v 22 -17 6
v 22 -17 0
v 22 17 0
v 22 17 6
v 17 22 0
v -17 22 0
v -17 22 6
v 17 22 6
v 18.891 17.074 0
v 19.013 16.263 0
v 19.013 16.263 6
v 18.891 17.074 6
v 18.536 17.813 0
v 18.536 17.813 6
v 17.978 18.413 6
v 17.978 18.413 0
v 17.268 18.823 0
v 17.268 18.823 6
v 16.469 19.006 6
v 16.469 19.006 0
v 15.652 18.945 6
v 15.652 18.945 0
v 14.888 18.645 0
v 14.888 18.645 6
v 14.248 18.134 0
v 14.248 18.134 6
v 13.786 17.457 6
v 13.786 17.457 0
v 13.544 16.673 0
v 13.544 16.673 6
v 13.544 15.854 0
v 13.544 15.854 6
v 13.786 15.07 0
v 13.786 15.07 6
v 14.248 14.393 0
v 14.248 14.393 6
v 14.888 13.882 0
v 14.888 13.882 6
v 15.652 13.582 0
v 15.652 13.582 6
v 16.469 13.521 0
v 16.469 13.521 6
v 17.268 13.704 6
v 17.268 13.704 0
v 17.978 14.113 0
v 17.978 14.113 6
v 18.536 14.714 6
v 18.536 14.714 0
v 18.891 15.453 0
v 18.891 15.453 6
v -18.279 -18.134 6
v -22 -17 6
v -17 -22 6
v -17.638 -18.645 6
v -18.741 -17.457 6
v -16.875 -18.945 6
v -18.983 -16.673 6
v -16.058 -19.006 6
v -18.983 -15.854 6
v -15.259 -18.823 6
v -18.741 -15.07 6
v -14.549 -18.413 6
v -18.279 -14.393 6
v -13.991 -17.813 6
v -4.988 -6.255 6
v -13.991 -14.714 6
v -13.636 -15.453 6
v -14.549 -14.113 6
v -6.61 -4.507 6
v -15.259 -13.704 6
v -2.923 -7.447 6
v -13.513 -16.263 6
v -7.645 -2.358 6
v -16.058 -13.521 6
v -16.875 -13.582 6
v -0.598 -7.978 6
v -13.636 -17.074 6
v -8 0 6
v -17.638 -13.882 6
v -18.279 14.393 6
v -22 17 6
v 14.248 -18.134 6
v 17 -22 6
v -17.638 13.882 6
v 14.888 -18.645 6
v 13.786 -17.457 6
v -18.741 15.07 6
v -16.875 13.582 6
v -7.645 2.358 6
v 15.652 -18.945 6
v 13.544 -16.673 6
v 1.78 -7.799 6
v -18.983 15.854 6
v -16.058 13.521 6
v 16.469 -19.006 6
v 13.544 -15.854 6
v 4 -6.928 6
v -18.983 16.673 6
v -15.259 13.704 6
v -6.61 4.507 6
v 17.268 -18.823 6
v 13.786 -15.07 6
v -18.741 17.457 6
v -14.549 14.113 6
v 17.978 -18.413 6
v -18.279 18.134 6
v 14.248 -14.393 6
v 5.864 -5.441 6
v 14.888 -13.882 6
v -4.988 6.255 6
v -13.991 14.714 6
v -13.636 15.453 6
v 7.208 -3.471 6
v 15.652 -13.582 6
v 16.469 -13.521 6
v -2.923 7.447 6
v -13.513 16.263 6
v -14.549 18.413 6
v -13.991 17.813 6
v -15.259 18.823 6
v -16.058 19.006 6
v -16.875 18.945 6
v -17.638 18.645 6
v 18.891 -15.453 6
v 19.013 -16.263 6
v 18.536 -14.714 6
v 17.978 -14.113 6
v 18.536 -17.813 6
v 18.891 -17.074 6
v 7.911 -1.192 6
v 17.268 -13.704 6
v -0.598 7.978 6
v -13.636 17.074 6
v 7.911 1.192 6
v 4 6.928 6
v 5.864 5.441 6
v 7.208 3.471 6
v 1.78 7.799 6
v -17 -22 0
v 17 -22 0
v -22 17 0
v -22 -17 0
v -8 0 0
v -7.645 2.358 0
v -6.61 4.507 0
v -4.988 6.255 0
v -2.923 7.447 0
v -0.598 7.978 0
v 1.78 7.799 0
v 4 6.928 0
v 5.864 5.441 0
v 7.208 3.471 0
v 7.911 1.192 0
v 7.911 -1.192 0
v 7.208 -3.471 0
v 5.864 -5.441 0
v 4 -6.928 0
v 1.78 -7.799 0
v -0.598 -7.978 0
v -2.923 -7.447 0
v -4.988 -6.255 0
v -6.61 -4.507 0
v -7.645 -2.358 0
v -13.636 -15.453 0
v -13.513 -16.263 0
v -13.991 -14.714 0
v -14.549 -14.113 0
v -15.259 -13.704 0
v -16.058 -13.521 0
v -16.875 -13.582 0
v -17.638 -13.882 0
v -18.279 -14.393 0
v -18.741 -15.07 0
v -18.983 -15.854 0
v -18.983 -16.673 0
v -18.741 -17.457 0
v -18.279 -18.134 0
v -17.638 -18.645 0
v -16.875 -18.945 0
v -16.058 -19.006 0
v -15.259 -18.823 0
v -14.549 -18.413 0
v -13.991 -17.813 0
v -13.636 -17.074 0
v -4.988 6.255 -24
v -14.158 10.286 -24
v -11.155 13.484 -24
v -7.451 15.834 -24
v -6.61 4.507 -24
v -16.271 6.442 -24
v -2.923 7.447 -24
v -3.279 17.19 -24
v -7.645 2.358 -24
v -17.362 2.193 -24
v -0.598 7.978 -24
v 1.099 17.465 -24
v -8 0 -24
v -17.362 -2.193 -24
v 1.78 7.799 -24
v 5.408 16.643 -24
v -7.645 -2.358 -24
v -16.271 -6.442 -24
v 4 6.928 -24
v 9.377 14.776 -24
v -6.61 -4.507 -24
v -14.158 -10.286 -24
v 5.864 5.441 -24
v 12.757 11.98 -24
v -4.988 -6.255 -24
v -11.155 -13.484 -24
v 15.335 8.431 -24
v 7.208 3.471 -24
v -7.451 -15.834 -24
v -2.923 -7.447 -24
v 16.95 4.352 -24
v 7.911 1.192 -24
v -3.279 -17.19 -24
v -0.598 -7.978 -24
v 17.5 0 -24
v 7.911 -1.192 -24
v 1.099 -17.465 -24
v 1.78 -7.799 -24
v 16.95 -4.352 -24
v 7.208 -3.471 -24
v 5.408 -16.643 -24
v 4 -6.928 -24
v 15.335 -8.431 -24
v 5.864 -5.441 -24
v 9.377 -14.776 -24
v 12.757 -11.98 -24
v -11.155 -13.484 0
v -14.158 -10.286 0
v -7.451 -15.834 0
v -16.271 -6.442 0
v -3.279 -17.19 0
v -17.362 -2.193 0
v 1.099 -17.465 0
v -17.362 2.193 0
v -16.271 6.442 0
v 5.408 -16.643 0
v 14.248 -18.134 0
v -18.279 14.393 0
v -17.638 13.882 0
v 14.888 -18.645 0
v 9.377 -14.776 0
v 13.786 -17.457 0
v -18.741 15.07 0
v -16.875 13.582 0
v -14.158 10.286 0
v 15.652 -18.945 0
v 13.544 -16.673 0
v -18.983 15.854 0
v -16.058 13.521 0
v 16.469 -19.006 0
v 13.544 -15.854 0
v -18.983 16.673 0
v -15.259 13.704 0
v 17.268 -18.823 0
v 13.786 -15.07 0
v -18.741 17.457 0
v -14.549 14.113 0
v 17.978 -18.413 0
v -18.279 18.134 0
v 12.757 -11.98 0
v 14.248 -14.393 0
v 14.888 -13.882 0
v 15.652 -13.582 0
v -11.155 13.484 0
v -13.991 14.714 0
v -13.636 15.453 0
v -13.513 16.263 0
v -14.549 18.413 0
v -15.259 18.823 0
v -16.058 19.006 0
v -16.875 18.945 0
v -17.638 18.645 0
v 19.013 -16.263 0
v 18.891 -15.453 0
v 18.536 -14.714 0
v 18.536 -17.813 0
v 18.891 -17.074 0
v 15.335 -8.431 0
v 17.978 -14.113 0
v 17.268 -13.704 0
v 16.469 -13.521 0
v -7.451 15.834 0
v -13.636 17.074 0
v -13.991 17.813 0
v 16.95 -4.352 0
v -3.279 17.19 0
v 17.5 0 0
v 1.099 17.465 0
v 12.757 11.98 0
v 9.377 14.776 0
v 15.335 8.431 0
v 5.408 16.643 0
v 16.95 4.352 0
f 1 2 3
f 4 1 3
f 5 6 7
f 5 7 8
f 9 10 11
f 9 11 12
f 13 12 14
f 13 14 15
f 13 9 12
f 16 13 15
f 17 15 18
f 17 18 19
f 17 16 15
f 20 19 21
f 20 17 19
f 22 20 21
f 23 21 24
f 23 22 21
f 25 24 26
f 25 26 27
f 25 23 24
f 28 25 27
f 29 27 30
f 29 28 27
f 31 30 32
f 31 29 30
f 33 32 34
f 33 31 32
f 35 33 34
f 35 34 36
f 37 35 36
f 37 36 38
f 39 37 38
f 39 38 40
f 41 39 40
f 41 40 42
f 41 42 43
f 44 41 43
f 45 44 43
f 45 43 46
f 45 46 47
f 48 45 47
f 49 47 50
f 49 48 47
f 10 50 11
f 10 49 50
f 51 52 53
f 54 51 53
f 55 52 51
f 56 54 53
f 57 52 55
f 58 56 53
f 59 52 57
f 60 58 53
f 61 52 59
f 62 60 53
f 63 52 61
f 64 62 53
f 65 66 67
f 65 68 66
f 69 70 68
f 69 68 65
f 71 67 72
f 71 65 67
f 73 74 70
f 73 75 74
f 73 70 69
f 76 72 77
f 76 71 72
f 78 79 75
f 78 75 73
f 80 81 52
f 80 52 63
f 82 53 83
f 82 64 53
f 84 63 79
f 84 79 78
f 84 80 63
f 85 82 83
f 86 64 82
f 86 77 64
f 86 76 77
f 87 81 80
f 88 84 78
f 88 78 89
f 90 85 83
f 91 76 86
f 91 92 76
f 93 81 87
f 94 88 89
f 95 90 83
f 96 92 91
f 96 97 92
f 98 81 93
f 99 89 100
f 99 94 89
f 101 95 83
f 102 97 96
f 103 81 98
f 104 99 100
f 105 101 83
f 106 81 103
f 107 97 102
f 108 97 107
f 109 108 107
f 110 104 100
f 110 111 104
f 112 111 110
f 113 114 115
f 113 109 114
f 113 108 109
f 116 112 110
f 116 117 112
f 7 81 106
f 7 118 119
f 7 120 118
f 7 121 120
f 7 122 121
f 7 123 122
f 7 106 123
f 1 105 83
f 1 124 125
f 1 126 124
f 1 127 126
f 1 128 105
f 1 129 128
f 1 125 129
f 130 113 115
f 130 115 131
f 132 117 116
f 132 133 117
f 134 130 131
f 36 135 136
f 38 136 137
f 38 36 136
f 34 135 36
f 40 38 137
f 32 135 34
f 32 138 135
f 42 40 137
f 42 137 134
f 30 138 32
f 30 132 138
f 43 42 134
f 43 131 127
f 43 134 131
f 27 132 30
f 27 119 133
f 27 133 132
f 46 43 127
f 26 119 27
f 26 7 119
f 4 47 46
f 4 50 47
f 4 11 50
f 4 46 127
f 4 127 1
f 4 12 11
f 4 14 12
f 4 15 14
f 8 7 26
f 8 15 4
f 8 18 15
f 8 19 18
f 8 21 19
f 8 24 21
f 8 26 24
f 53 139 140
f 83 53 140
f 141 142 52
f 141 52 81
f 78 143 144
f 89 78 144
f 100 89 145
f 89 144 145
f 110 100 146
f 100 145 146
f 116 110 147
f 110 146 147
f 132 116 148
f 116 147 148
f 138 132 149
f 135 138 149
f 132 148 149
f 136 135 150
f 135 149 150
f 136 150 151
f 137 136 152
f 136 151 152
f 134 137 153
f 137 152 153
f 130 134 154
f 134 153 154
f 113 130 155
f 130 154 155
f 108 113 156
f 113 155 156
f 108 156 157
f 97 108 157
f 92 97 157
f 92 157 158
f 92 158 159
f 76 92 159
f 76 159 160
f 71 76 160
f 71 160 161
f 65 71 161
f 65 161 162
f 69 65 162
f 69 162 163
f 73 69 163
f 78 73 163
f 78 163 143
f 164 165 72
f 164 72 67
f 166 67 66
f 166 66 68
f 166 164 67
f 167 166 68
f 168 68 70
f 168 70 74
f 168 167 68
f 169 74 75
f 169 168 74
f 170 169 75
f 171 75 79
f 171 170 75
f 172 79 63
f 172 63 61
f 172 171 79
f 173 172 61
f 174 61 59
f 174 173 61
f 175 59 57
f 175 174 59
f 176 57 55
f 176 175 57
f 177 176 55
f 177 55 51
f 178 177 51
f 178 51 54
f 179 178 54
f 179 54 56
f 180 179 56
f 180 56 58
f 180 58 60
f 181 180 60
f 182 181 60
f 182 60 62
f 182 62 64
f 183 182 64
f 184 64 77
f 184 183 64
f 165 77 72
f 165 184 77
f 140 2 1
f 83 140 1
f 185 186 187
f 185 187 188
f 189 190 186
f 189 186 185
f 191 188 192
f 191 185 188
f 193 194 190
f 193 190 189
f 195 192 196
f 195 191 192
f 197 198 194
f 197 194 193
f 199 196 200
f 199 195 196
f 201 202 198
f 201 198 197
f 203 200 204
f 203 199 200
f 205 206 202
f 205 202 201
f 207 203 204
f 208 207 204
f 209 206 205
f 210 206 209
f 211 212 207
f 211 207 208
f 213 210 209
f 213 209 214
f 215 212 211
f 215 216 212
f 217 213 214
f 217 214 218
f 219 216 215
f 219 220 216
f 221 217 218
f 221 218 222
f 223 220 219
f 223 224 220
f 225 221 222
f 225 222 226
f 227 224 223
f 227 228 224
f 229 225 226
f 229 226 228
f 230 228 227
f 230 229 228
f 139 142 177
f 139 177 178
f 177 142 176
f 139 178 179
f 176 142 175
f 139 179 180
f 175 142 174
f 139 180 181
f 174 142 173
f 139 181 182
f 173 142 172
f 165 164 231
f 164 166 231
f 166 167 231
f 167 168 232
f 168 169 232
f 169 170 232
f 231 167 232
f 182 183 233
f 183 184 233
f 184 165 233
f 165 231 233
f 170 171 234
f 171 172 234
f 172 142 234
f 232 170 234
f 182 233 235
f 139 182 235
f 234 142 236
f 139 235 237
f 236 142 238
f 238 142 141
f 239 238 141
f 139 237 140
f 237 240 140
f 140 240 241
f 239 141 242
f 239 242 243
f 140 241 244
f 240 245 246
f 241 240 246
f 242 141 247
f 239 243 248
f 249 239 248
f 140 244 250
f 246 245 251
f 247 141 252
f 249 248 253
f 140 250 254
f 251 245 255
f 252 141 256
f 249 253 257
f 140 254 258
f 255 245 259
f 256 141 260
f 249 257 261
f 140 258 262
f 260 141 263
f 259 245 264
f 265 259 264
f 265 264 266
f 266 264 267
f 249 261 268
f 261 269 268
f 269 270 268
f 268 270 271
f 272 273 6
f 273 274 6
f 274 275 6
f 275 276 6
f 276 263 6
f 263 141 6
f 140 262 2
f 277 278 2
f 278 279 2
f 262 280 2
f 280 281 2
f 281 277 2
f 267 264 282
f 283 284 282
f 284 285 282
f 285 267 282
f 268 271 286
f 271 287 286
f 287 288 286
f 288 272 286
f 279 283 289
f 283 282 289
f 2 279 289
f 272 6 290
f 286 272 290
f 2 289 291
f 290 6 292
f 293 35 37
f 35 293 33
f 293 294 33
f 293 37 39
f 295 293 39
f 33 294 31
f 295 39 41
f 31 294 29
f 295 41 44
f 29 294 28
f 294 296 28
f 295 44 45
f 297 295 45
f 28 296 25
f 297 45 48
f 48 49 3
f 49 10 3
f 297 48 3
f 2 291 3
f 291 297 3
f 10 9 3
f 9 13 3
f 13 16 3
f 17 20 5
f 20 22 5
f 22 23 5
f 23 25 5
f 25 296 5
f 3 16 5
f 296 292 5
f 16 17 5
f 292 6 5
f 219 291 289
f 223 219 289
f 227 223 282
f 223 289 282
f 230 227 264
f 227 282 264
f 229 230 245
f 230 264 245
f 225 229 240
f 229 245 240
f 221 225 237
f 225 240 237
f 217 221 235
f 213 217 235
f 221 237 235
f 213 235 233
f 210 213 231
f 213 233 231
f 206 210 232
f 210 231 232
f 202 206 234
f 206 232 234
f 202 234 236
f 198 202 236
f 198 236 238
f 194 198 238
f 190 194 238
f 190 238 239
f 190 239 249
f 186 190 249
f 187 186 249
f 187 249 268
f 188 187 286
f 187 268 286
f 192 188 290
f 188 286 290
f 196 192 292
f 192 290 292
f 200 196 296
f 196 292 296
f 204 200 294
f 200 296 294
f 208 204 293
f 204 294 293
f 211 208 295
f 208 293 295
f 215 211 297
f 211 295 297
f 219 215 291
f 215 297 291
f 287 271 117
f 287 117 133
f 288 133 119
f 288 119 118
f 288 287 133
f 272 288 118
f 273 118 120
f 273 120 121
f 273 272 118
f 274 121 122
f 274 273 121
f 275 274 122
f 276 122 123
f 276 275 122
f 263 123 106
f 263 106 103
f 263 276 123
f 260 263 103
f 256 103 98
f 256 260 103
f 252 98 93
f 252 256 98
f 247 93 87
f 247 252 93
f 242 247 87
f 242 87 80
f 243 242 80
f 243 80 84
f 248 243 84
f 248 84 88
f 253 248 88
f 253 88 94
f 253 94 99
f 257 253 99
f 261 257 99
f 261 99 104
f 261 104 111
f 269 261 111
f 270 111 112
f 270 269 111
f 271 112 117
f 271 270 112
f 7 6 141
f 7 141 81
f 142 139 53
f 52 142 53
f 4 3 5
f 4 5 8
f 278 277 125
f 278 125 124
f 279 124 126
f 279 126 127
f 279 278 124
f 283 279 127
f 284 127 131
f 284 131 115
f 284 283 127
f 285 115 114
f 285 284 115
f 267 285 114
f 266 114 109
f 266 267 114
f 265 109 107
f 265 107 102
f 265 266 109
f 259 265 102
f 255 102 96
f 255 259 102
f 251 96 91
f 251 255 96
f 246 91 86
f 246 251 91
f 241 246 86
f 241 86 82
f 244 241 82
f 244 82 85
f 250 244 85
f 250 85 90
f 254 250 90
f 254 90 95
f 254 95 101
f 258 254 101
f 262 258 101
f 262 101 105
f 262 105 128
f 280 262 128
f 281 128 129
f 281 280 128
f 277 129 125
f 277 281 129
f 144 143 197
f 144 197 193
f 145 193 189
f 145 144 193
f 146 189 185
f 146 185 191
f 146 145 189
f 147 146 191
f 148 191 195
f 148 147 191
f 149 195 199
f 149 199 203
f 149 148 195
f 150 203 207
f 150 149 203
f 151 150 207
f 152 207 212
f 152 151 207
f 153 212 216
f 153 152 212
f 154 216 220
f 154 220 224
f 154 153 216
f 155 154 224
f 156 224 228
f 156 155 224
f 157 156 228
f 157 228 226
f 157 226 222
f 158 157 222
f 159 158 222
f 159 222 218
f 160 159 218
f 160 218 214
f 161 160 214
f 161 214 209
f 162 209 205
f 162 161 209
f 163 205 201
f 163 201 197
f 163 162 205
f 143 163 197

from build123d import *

# Parameters (mm, degrees)
SKETCH_1_W          = 44
SKETCH_1_H          = 44
SKETCH_1_R          = 2.75
EXTRUDE_1_DEPTH     = 6
CHAMFER_1_SIZE      = 5
SKETCH_2_R          = 17.5
SKETCH_2_R_2        = 8
EXTRUDE_2_DEPTH     = 24
SKETCH_3_R          = 8
CUT_EXTRUDE_1_DEPTH = 40.293765409


with BuildPart() as part:
    # 草图1 → 凸台-拉伸1 (new body)
    with BuildSketch(Plane.XY):
        Rectangle(SKETCH_1_W, SKETCH_1_H)
        with Locations((-16.263455967, 16.263455967)):
            Circle(SKETCH_1_R, mode=Mode.SUBTRACT)
        with Locations((16.263455967, 16.263455967)):
            Circle(SKETCH_1_R, mode=Mode.SUBTRACT)
        with Locations((16.263455967, -16.263455967)):
            Circle(SKETCH_1_R, mode=Mode.SUBTRACT)
        with Locations((-16.263455967, -16.263455967)):
            Circle(SKETCH_1_R, mode=Mode.SUBTRACT)
    extrude(amount=EXTRUDE_1_DEPTH)

    # 倒角1
    chamfer_1_edges = [part.edges().sort_by_distance(p)[0] for p in [
        (-22, 22, 3),
        (22, 22, 3),
        (22, -22, 3),
        (-22, -22, 3),
    ]]
    chamfer(chamfer_1_edges, length=CHAMFER_1_SIZE)

    # 草图2 → 凸台-拉伸2 (add)
    with BuildSketch(Plane(origin=(0, 0, 0), x_dir=(-1, 0, 0), z_dir=(0, 0, -1))):
        with Locations(Location((0, 0, 0), (0, 0, 180))):
            Circle(SKETCH_2_R)
        Circle(SKETCH_2_R_2, mode=Mode.SUBTRACT)
    extrude(amount=EXTRUDE_2_DEPTH)

    # 草图3 → 切除-拉伸1 (cut, through all)
    with BuildSketch(Plane(origin=(0, 0, 0), x_dir=(-1, 0, 0), z_dir=(0, 0, -1))):
        Circle(SKETCH_3_R)
    extrude(amount=-CUT_EXTRUDE_1_DEPTH, mode=Mode.SUBTRACT)


solid = part.part
